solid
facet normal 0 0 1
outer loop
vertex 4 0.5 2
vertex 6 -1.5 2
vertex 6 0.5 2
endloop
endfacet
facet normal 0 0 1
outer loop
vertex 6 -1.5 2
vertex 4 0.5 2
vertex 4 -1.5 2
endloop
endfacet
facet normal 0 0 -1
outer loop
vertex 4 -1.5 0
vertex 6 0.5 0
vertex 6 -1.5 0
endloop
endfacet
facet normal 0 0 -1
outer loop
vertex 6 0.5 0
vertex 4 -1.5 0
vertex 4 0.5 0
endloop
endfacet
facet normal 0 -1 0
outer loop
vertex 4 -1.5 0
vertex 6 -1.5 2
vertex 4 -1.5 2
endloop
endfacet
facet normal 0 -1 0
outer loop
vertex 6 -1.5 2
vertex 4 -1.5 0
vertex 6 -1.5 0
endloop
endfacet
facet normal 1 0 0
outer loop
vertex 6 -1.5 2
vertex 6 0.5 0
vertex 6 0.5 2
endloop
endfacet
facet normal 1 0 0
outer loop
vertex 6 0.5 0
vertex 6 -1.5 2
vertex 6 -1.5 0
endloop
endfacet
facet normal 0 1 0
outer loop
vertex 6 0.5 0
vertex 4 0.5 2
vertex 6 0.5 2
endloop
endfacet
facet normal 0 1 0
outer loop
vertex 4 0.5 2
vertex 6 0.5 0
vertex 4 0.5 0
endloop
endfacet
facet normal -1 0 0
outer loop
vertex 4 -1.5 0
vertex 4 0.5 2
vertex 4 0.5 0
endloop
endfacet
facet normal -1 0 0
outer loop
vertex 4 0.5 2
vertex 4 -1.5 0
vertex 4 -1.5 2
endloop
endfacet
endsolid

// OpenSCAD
union() {
  translate([4.0, -1.5, 0.0]) cube(size=[2.0,2.0,2.0], center=false);
}
